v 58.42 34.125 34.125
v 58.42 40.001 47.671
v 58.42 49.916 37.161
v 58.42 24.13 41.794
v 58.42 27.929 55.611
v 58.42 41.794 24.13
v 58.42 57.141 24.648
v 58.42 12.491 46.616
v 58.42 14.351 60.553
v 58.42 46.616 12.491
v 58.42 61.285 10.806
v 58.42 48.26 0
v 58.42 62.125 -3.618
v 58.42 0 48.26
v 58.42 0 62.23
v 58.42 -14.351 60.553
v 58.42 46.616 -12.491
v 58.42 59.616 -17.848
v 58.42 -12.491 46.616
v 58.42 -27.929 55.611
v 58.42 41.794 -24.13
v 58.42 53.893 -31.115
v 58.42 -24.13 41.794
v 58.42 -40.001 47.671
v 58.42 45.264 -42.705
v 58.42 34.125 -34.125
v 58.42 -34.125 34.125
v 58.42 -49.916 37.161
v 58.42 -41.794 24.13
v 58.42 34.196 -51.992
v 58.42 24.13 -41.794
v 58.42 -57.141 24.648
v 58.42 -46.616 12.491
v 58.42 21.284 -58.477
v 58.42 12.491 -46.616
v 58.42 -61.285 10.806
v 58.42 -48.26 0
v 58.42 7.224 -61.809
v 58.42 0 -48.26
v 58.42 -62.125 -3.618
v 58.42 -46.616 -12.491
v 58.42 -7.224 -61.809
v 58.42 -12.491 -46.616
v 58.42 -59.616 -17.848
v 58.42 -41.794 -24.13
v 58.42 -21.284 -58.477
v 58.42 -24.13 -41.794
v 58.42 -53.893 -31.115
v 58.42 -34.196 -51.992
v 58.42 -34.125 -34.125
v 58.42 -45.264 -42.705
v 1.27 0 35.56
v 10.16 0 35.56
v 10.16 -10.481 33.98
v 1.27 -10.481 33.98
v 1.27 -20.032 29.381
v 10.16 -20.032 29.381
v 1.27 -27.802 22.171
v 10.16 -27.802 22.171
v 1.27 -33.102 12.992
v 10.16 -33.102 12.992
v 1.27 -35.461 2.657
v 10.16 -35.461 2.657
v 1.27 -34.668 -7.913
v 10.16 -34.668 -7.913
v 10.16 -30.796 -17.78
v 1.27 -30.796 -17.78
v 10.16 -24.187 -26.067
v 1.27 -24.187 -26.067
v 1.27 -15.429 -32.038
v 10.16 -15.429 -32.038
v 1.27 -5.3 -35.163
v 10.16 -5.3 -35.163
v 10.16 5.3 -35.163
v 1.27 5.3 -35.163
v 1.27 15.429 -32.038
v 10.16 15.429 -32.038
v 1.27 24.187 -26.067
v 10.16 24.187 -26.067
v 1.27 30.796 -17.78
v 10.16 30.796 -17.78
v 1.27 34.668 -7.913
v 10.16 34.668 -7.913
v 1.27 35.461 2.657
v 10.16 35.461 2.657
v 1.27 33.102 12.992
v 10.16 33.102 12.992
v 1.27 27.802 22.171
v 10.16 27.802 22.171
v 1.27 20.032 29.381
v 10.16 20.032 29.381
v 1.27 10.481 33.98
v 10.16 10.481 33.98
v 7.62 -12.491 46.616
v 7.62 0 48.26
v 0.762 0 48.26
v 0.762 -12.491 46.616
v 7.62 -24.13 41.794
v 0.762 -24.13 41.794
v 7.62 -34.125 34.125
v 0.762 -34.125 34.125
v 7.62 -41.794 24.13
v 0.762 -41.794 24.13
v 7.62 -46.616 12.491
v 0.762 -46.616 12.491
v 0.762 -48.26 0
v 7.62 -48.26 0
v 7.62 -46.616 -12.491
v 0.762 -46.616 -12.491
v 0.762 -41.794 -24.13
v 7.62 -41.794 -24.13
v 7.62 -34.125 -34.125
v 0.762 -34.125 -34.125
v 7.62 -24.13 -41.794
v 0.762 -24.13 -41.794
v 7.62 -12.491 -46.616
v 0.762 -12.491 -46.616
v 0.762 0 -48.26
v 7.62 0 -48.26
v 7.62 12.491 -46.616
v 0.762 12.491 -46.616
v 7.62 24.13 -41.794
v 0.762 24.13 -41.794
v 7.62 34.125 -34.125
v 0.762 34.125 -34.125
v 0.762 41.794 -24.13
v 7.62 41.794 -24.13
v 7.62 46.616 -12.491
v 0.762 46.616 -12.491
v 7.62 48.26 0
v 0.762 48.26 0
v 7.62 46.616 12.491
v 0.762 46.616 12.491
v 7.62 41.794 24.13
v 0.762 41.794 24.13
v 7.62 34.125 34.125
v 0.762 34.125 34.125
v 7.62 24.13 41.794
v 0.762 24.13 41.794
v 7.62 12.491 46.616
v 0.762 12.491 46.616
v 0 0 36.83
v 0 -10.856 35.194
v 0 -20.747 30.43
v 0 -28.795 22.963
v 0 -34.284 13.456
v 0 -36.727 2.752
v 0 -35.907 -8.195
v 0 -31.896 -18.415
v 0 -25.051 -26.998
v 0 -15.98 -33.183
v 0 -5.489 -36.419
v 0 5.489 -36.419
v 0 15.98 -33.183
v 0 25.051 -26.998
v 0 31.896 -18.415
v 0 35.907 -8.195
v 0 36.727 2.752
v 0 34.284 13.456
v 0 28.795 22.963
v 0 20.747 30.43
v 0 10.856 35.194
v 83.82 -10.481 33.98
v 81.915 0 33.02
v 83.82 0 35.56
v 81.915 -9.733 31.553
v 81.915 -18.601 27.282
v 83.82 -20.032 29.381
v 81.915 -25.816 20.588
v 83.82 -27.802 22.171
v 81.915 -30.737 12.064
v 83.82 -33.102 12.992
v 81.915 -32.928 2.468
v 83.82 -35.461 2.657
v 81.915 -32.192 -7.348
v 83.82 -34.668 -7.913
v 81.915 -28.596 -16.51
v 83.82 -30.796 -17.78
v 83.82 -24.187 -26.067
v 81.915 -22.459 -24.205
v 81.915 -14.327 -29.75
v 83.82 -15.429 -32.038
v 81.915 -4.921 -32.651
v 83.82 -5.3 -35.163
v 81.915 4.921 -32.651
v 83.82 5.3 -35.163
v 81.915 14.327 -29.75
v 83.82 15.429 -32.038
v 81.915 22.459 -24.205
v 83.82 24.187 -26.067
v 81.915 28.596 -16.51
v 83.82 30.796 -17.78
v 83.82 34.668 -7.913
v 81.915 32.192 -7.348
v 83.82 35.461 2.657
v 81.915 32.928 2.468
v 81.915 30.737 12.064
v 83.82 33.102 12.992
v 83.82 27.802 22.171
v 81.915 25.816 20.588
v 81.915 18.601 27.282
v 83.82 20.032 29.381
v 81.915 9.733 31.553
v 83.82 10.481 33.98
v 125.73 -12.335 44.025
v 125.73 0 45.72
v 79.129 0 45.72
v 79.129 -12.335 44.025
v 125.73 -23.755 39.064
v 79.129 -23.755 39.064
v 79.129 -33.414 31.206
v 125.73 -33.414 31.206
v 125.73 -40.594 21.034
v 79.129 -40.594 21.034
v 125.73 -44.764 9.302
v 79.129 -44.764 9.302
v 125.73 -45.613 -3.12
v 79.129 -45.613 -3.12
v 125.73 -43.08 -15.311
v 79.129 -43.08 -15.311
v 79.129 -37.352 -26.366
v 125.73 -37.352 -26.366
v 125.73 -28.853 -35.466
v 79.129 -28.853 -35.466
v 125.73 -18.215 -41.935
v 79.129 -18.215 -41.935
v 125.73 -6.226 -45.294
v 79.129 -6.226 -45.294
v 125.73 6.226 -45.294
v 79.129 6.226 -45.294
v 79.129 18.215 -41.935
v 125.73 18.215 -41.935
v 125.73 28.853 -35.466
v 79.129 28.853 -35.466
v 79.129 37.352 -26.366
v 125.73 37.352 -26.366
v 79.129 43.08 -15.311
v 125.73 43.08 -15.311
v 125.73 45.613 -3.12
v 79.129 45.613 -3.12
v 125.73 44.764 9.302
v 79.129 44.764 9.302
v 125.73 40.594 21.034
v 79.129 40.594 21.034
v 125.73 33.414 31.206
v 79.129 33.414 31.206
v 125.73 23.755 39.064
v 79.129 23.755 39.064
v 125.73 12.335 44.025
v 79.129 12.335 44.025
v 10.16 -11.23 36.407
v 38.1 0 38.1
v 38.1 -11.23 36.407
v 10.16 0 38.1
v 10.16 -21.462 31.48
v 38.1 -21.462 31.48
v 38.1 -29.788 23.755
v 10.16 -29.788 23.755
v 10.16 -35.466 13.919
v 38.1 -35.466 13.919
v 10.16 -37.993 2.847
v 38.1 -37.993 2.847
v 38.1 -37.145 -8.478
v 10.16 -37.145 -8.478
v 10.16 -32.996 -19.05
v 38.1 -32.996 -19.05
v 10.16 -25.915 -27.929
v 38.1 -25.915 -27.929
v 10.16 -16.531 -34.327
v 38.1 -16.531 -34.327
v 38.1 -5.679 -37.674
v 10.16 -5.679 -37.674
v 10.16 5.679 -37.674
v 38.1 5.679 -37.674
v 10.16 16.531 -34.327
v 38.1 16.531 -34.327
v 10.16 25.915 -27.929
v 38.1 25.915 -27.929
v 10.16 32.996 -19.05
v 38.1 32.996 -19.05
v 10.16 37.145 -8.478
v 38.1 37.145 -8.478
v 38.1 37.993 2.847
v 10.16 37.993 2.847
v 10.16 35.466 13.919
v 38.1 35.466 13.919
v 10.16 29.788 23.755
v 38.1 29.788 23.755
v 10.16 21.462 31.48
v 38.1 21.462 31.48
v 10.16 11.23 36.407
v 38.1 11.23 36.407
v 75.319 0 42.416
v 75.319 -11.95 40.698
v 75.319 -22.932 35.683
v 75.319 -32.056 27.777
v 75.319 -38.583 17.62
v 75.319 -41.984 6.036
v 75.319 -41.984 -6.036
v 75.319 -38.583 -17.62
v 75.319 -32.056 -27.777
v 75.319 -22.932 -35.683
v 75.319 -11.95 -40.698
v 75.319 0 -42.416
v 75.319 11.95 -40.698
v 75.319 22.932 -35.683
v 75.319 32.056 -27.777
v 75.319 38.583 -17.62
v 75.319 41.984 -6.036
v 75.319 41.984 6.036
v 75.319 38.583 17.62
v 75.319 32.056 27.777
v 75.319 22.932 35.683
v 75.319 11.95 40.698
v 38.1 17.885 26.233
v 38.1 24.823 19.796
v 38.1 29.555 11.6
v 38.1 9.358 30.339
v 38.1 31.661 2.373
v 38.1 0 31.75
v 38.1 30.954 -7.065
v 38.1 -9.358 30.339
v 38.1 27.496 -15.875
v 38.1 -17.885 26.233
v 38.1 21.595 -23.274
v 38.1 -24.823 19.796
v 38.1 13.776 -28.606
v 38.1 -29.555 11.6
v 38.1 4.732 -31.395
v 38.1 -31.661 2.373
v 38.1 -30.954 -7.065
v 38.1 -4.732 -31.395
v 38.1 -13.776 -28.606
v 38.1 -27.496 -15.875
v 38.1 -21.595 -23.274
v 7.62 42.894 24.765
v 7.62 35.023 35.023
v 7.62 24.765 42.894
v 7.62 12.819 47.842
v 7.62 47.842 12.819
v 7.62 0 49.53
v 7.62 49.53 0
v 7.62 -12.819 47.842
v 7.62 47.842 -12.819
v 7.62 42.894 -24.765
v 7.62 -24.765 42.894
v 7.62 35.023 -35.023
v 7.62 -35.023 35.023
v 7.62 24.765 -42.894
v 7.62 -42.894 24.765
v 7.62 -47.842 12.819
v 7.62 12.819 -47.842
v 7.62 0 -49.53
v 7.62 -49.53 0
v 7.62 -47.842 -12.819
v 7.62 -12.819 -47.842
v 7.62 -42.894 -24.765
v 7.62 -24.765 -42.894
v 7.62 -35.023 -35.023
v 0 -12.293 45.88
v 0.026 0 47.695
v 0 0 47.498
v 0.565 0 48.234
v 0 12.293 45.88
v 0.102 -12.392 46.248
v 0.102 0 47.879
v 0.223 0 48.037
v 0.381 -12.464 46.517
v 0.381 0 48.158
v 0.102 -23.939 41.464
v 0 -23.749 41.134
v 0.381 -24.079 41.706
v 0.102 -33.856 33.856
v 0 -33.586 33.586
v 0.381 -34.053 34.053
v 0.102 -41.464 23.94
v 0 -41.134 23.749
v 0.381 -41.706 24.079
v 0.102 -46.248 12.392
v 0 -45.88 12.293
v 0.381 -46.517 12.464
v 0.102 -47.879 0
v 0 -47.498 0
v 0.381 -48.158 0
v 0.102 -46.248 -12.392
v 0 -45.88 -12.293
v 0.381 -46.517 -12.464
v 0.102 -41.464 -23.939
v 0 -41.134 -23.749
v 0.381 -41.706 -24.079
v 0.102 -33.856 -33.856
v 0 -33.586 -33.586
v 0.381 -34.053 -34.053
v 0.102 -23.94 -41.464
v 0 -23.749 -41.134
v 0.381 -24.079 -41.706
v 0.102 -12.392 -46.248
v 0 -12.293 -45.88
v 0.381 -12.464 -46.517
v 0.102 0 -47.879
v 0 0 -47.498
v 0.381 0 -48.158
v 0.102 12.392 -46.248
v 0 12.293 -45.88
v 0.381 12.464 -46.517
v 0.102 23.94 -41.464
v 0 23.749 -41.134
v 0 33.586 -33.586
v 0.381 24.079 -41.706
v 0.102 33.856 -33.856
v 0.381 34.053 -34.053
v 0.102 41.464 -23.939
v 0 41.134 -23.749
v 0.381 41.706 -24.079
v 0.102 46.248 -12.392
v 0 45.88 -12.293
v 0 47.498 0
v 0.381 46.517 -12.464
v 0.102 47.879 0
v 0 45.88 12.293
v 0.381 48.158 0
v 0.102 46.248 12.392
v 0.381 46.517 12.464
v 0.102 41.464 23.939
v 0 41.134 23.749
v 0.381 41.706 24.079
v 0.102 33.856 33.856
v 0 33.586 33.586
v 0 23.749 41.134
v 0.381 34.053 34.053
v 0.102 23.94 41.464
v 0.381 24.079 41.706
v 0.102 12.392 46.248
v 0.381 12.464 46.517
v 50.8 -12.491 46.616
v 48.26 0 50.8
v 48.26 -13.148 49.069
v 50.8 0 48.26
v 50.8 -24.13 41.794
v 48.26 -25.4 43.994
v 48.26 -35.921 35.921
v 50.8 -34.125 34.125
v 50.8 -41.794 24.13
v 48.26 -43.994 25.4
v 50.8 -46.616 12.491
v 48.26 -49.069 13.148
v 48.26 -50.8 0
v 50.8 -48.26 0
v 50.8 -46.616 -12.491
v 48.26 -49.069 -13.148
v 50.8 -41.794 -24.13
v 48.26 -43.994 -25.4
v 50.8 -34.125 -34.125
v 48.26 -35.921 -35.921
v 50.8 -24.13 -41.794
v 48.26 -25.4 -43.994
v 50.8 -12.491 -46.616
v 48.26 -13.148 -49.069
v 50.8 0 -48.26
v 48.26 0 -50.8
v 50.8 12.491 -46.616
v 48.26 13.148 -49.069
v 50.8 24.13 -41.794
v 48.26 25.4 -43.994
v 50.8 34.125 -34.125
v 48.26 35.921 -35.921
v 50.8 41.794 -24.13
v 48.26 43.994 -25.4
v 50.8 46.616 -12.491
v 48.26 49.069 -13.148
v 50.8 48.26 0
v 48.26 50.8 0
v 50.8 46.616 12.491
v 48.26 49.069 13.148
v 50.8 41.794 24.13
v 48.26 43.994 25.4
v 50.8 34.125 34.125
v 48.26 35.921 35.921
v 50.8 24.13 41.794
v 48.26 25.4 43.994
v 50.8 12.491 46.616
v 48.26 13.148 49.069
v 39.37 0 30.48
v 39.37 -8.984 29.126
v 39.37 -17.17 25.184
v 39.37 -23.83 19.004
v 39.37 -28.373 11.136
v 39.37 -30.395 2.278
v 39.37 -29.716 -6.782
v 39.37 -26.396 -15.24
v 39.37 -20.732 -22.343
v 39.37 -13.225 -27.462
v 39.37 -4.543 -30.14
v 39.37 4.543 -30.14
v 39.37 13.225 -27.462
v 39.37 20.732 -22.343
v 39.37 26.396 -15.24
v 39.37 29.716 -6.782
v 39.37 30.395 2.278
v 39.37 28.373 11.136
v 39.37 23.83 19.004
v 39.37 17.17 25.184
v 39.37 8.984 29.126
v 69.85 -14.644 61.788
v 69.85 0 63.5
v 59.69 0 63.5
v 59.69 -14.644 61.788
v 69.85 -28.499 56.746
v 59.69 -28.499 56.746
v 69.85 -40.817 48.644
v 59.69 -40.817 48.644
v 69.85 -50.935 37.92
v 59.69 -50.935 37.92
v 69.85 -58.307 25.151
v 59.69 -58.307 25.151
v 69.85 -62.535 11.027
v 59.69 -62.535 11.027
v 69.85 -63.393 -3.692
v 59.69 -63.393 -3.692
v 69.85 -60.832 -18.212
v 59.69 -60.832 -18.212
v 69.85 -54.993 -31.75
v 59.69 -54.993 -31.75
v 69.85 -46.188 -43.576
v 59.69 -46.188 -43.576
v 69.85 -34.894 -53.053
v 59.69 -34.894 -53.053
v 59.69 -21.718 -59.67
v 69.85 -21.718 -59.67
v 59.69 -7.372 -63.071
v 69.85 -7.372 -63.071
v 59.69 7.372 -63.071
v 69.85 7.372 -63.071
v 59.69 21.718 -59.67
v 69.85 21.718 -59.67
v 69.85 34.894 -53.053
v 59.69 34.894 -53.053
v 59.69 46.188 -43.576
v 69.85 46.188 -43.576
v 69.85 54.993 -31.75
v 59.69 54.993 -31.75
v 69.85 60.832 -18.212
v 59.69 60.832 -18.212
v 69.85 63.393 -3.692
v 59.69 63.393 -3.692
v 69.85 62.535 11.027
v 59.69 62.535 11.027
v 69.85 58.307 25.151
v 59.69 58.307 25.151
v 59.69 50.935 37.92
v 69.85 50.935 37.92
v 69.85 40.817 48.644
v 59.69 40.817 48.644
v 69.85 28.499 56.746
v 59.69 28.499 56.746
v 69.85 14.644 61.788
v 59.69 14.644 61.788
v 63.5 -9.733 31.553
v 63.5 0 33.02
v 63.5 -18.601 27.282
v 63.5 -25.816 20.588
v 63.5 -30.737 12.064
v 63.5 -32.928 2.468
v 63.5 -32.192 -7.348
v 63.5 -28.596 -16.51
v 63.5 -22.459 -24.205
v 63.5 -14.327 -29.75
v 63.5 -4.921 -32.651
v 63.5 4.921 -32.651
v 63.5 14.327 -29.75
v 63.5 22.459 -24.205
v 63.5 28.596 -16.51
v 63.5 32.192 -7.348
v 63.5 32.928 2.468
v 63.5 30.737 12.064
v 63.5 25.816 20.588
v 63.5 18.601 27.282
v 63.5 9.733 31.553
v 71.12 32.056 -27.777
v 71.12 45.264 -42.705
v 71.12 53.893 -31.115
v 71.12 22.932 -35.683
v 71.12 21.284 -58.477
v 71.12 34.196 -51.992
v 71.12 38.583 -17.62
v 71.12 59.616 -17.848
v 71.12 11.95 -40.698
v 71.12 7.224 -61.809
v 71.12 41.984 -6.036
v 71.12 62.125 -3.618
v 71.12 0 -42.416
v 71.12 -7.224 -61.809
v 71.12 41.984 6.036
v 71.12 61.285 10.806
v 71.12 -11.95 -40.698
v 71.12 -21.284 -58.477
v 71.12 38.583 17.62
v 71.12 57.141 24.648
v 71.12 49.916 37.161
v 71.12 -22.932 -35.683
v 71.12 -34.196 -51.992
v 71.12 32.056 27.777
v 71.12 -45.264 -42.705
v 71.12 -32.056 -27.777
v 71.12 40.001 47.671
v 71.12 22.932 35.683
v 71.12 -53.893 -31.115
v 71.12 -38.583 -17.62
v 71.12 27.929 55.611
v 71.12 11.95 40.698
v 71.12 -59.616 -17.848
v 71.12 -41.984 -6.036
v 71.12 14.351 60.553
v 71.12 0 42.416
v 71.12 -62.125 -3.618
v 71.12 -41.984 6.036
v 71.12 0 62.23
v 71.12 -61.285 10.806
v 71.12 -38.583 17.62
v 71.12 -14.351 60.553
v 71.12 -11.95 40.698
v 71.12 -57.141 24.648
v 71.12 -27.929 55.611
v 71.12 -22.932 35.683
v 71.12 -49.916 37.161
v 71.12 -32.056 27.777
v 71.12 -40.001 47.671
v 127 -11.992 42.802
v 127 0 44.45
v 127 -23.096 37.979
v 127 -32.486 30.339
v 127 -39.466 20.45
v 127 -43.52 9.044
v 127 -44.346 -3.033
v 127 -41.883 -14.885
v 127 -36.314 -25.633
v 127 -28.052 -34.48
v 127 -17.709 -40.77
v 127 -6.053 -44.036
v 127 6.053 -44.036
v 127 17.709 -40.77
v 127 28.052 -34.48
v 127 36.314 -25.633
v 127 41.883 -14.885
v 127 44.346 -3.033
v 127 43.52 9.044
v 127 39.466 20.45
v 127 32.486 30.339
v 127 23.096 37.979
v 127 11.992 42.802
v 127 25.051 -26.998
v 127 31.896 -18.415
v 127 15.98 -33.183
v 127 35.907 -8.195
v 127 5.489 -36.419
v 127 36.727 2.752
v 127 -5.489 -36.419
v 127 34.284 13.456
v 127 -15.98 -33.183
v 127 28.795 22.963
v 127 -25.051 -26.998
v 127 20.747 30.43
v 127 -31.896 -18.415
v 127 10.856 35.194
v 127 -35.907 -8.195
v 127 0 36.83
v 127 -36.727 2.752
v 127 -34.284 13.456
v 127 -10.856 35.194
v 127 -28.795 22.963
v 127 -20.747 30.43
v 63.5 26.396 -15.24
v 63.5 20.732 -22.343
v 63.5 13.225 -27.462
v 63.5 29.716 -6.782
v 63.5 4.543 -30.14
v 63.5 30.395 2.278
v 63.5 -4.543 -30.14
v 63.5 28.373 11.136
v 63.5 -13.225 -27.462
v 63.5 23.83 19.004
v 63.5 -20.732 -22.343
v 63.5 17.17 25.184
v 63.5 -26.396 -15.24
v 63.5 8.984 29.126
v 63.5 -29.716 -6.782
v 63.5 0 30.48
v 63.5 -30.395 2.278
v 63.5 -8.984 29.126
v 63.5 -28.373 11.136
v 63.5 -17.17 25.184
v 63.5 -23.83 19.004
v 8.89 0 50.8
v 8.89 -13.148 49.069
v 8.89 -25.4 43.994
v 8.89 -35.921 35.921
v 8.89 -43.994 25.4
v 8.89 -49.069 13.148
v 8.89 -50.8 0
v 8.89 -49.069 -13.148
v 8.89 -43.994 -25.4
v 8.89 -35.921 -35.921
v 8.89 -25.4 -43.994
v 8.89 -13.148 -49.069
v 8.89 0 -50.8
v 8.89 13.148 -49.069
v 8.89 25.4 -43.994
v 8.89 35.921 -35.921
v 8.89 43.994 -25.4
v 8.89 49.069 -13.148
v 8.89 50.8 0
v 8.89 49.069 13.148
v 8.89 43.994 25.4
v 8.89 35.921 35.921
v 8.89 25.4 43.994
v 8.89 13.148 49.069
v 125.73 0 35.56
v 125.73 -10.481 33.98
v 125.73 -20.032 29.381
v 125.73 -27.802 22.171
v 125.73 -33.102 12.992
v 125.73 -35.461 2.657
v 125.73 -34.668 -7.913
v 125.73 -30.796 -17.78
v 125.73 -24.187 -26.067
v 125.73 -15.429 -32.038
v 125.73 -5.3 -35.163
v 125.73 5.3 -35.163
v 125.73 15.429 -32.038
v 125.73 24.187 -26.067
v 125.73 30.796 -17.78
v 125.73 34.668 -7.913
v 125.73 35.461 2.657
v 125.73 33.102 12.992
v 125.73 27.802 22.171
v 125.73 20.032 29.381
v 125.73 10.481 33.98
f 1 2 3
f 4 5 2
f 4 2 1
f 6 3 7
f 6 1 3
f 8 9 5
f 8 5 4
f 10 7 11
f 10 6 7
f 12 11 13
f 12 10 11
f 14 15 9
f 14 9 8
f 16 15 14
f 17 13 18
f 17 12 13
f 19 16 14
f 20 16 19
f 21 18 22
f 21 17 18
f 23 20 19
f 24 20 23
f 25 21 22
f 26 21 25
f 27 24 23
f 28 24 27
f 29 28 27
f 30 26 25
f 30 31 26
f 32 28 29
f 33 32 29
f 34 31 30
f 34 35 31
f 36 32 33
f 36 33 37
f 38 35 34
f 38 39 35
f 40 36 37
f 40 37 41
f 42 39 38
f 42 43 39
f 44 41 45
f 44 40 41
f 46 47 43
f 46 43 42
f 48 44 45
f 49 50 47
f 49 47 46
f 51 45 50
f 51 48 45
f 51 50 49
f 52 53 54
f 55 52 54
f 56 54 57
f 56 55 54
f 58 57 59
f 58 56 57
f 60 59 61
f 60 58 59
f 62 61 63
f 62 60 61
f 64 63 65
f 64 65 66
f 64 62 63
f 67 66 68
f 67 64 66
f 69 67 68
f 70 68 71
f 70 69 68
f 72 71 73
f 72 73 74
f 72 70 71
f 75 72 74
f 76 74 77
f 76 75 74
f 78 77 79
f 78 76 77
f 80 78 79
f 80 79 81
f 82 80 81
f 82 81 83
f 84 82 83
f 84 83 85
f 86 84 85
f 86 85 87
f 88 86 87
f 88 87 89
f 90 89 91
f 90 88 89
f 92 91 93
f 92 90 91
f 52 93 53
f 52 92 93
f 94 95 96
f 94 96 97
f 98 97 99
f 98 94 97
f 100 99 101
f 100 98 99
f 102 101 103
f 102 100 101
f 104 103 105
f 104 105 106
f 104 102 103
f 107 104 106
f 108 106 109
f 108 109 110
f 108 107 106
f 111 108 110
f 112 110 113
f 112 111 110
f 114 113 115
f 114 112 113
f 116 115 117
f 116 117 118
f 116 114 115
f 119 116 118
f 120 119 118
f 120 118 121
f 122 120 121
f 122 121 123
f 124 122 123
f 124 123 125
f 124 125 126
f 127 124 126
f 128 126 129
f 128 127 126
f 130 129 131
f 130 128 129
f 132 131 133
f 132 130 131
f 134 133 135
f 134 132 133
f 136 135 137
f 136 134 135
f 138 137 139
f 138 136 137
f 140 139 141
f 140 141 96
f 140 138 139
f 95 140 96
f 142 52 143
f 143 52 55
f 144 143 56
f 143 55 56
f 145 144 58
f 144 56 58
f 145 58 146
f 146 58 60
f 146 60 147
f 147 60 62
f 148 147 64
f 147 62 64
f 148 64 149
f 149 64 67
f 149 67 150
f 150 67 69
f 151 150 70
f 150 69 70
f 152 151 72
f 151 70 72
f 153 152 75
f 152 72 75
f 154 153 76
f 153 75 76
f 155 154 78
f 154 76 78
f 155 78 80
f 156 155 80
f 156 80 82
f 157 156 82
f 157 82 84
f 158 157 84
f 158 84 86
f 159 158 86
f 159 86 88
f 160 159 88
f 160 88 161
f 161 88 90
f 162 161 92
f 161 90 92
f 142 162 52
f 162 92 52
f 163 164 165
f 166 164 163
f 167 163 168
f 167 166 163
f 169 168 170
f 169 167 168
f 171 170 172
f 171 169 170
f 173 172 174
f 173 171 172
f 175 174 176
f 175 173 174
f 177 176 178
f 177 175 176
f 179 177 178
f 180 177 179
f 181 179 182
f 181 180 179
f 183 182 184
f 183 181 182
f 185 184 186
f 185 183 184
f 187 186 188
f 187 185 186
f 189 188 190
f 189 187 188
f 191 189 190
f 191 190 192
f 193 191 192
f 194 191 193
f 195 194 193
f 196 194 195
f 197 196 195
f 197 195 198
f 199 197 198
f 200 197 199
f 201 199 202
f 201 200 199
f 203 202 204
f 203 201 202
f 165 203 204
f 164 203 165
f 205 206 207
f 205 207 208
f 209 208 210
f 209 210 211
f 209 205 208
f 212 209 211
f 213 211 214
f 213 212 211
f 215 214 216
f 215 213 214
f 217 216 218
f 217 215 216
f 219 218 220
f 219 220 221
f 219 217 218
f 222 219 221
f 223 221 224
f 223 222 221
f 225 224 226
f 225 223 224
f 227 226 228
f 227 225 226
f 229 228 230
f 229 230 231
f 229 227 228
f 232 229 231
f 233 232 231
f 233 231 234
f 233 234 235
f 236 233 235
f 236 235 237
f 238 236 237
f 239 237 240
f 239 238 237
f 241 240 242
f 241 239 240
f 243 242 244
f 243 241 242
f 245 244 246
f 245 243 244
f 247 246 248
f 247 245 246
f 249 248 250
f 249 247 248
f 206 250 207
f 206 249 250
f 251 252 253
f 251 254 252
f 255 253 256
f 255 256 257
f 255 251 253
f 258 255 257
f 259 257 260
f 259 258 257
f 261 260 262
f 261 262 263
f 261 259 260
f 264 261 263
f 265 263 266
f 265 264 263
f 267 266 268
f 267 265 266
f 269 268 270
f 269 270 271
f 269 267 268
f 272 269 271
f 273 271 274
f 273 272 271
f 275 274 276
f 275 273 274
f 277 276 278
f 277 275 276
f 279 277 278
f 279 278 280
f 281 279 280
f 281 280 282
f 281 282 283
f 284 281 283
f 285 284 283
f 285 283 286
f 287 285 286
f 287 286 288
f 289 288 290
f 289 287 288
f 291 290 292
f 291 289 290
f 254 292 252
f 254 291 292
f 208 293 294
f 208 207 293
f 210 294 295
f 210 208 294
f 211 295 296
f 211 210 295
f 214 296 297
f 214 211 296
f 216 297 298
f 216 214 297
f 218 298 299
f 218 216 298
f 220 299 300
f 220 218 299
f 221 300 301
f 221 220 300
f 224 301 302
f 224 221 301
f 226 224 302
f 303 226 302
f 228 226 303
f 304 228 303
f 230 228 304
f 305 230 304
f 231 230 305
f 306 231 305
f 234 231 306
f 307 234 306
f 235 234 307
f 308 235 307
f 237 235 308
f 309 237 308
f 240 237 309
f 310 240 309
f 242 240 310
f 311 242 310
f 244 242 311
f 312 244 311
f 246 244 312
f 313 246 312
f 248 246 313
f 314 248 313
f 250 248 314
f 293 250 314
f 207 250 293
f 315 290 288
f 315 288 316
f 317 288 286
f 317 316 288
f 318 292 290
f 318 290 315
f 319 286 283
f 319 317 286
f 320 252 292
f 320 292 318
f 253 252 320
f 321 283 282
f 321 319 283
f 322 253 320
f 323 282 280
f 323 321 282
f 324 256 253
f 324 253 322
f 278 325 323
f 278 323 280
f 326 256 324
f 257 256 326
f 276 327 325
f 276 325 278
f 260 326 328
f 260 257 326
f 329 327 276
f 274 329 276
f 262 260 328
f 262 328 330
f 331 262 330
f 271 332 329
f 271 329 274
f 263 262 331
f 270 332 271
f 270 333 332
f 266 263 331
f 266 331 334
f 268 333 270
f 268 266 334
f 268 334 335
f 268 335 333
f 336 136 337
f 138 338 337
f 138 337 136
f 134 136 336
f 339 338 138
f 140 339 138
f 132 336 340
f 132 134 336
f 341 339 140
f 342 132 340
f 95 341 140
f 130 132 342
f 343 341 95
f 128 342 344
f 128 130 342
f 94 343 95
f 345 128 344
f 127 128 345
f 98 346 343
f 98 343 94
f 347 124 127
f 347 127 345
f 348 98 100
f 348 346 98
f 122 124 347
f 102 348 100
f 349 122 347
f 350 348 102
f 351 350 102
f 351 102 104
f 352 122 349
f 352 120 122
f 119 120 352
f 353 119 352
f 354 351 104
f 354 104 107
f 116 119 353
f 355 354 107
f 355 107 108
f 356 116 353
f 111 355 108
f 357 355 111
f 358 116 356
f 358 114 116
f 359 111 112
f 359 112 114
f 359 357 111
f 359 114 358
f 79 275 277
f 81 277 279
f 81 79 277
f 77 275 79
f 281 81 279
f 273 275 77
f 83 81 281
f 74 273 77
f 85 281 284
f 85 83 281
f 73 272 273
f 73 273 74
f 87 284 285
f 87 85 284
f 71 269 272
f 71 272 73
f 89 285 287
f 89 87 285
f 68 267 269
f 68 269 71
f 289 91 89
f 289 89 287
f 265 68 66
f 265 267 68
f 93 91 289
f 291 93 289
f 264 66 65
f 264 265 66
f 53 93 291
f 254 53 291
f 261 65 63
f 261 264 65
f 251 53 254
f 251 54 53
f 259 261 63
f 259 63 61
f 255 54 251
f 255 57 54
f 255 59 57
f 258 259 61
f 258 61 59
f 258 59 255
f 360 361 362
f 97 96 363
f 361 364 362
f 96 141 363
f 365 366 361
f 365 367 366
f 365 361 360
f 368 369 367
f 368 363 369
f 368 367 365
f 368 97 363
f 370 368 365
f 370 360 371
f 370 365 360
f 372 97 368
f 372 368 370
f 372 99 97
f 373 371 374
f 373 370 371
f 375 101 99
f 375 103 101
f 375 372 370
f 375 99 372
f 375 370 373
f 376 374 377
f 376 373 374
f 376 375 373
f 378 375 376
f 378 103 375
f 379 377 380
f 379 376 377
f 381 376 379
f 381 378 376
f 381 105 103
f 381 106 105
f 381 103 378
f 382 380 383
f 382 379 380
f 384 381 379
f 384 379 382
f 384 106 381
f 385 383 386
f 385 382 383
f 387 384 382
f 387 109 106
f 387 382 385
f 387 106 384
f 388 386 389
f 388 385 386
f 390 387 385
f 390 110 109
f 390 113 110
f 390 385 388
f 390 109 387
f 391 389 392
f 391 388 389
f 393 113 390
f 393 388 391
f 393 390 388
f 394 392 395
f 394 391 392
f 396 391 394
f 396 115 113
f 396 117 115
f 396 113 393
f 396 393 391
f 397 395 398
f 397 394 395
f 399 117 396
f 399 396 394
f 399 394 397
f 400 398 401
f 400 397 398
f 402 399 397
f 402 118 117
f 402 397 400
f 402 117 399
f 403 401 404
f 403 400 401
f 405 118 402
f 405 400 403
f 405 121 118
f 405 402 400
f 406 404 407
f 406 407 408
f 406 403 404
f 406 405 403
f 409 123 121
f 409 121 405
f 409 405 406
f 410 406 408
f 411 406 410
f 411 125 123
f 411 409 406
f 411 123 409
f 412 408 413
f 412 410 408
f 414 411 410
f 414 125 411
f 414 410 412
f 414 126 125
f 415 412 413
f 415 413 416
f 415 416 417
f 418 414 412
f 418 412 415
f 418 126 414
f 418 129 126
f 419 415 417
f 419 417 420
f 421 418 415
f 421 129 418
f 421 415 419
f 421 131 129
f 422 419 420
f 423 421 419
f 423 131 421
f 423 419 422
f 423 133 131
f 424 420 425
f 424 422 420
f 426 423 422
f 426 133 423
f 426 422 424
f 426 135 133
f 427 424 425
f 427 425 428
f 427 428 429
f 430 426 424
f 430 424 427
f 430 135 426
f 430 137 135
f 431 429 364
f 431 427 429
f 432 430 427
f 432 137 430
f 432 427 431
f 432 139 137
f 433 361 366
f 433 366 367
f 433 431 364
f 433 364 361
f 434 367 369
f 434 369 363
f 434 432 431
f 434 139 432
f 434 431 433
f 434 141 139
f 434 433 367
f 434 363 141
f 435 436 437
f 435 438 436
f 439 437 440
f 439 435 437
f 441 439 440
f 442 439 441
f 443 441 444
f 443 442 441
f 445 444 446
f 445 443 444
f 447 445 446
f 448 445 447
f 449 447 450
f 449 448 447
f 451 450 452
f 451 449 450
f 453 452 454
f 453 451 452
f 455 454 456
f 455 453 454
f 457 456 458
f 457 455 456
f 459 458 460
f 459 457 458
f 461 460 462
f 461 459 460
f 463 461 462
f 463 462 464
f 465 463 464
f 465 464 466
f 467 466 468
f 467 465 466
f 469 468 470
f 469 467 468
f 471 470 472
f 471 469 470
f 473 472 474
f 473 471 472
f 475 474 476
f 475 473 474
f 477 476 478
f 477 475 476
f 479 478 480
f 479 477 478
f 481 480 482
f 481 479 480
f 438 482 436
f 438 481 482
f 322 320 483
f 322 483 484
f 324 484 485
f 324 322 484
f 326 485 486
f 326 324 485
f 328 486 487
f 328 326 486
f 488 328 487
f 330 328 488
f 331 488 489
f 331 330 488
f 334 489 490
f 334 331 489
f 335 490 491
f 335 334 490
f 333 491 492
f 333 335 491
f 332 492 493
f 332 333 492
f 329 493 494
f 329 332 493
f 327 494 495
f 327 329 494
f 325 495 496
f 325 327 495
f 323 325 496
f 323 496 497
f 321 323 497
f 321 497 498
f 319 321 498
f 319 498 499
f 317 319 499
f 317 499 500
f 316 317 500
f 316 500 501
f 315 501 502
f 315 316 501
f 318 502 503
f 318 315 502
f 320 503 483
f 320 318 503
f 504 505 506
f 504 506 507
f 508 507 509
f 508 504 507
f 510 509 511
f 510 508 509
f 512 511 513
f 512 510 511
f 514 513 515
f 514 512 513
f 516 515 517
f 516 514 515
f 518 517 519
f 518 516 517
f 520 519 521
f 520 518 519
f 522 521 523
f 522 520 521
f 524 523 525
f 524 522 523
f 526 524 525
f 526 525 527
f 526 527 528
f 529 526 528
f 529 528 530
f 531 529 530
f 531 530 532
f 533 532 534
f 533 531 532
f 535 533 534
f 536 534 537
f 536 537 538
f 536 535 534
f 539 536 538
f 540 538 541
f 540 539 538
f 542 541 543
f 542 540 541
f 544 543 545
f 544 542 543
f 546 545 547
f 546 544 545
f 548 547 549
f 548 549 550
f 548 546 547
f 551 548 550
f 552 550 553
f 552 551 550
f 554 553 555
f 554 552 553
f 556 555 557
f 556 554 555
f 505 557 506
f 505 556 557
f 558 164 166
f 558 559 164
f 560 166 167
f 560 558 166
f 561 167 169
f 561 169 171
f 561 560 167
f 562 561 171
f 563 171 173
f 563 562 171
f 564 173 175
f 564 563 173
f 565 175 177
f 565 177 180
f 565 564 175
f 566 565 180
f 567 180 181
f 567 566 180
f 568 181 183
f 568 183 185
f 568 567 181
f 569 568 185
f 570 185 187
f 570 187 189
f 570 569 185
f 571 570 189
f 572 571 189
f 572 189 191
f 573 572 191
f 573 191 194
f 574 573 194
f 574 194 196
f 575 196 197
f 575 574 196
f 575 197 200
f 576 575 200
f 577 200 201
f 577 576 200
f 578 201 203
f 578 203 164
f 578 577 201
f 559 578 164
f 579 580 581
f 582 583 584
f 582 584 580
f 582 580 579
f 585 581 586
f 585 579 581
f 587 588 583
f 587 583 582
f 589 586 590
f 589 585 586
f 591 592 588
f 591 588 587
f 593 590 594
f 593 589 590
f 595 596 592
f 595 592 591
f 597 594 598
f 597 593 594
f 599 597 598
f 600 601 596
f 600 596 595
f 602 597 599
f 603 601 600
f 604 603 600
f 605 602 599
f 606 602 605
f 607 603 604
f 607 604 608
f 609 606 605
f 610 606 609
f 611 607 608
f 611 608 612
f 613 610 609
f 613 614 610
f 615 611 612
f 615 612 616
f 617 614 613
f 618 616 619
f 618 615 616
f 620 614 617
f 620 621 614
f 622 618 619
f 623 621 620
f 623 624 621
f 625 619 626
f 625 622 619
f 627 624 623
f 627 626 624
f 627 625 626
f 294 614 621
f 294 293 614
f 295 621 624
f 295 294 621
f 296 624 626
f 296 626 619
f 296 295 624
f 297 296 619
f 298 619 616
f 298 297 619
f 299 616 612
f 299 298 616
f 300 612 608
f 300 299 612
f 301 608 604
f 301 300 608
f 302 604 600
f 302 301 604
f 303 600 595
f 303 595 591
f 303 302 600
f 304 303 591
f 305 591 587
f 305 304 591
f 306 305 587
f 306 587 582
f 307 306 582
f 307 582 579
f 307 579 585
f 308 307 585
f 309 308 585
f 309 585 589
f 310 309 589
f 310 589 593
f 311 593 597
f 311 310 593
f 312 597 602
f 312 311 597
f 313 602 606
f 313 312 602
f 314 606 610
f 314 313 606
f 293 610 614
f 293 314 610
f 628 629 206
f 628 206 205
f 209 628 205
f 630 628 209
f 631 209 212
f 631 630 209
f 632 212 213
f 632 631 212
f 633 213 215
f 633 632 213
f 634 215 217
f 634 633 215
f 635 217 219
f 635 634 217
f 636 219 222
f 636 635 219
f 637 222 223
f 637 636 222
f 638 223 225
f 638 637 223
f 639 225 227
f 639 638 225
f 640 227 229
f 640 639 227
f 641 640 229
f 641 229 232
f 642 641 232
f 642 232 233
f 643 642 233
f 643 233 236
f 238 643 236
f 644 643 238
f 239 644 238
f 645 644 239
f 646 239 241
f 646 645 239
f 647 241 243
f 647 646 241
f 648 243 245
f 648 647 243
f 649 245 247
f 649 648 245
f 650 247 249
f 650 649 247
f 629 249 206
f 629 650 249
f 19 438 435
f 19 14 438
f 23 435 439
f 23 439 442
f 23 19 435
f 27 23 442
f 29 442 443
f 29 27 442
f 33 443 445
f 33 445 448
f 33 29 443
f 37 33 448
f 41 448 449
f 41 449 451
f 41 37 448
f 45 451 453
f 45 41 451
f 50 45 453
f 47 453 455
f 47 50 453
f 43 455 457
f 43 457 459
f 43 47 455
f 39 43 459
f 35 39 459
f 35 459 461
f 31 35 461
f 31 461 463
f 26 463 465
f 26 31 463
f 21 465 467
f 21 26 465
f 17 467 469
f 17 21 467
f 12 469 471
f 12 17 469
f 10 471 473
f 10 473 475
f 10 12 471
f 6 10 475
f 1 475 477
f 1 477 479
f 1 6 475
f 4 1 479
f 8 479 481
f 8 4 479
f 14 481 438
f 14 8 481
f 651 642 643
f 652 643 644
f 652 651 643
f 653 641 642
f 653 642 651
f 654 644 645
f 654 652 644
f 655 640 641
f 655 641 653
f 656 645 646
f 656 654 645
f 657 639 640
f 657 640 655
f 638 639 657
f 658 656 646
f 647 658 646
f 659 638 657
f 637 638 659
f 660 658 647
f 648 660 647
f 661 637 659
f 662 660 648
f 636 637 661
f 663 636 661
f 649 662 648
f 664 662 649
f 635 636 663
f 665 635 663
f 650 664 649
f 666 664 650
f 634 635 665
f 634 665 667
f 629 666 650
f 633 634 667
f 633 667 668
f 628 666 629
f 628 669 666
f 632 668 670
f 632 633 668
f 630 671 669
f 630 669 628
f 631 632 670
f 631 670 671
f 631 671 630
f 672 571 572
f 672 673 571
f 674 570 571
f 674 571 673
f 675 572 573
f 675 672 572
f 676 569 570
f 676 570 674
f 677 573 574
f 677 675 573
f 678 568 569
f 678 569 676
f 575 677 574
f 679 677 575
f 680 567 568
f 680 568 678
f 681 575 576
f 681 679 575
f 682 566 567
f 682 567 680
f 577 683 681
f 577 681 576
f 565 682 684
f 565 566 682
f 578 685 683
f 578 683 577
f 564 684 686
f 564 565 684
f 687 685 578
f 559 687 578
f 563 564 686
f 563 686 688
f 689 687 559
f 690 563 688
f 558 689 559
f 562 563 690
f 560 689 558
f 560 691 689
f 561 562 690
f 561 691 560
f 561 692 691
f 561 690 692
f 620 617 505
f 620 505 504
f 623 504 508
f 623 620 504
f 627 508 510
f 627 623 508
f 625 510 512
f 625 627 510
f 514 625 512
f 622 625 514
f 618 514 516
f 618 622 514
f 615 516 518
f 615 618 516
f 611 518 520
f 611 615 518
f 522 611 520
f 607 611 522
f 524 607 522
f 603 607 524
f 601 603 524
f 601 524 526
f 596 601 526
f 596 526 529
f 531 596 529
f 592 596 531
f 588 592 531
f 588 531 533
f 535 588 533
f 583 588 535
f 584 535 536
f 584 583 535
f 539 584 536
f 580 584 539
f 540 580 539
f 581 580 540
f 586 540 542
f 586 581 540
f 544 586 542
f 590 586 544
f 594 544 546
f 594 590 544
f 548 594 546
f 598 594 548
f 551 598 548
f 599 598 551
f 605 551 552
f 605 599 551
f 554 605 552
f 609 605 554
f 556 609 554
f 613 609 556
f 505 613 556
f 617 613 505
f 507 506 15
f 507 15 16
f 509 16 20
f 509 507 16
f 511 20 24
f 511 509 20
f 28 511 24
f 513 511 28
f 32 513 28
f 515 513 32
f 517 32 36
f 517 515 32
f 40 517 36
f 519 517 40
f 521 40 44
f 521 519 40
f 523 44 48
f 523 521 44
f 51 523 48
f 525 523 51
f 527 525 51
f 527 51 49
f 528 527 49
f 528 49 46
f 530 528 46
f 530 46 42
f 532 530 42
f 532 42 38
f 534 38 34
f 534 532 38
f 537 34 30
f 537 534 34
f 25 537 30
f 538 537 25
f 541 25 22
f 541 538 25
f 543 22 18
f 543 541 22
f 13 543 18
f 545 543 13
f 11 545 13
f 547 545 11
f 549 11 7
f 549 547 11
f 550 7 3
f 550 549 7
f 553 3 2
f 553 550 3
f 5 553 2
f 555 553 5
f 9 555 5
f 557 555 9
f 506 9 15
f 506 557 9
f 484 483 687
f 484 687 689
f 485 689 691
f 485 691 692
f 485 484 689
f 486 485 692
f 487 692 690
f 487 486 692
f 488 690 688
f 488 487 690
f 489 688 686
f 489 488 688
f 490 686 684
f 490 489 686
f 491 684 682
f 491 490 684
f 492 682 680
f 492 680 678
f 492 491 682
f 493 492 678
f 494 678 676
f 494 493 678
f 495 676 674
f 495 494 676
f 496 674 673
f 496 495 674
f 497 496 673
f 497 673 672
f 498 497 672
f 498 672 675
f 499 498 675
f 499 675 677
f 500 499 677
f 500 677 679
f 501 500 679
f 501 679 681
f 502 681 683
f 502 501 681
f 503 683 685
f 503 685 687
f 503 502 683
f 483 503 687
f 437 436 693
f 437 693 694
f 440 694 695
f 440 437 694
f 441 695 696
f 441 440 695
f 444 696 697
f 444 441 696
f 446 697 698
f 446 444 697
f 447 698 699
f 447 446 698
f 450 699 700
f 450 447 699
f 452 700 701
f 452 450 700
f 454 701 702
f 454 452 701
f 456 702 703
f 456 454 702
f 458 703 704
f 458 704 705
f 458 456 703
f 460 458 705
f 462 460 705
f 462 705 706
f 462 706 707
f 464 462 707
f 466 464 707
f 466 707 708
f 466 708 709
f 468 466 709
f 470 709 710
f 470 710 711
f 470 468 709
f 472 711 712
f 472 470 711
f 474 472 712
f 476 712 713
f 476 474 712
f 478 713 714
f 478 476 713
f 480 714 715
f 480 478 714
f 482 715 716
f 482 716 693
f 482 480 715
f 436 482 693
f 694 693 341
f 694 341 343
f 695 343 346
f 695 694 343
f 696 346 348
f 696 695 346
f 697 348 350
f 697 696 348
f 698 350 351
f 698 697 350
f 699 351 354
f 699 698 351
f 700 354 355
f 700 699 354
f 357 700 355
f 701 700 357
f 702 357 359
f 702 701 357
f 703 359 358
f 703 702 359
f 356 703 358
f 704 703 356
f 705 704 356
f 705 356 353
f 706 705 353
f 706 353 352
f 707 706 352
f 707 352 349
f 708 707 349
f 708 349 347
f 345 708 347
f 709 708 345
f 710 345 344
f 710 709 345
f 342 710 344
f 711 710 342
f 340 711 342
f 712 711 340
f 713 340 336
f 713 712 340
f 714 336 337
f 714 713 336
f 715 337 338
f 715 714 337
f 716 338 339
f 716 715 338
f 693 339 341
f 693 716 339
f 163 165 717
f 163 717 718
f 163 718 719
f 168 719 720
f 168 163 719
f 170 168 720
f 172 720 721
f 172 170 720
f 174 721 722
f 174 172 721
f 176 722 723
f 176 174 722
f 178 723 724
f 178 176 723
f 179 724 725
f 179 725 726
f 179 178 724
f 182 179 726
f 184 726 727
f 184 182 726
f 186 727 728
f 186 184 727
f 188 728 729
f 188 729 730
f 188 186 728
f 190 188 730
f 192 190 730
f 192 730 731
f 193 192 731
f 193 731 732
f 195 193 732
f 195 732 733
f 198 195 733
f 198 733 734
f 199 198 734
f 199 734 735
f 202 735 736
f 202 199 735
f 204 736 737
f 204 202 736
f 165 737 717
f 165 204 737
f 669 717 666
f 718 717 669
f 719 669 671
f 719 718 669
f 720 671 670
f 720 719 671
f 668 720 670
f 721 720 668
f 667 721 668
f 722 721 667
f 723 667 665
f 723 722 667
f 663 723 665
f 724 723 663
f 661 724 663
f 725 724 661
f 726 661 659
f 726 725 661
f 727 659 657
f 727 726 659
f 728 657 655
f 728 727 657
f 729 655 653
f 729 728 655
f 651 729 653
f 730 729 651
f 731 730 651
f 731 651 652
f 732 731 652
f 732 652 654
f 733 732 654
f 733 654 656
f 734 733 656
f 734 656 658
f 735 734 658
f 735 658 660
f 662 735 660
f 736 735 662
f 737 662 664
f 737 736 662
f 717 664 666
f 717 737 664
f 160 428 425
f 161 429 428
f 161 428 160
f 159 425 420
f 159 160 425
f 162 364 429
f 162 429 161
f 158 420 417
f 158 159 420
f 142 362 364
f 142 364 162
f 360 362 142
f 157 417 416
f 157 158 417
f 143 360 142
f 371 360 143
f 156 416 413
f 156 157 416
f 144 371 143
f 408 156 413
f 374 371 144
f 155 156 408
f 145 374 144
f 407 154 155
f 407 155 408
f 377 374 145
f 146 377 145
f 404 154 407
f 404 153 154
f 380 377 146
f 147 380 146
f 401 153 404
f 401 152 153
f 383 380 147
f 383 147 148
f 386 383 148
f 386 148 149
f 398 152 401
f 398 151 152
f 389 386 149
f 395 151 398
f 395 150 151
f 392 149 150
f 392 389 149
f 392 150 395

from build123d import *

# Parameters (mm, degrees)
CHAMFER1_SIZE = 1.27
FILLET1_R     = 0.762


with BuildPart() as part:
    # Sketch1 → Base-Revolve (revolve)
    with BuildSketch(Plane.XY, mode=Mode.PRIVATE) as base_revolve_sk:
        Polygon((0, 35.56), (0, 48.26), (7.62, 48.26), (7.62, 50.8), (48.26, 50.8), (50.8, 48.26), (58.42, 48.26), (58.42, 63.5), (71.12, 63.5), (71.12, 42.416108007), (75.319090909, 42.416108007), (79.129090909, 45.72), (127, 45.72), (127, 35.56), (83.82, 35.56), (81.915, 33.02), (63.5, 33.02), (63.5, 30.48), (38.1, 30.48), (38.1, 38.1), (10.16, 38.1), (10.16, 35.56), align=None)
    revolve(base_revolve_sk.sketch.rotate(Axis((0, 0, 0), (1, 0, 0)), 90), axis=Axis((0, 0, 0), (1, 0, 0)))

    # Chamfer1
    chamfer1_edges = [part.edges().sort_by_distance(p)[0] for p in [
        (0, 0, -35.56),
        (7.62, 0, -50.8),
        (58.42, 0, -63.5),
        (71.12, 0, -63.5),
        (127, 0, -45.72),
        (127, 0, -35.56),
        (38.1, 0, -30.48),
    ]]
    chamfer(chamfer1_edges, length=CHAMFER1_SIZE)

    # Fillet1
    fillet1_edges = [part.edges().sort_by_distance(p)[0] for p in [
        (0, 0, -48.26),
    ]]
    fillet(fillet1_edges, radius=FILLET1_R)


solid = part.part
